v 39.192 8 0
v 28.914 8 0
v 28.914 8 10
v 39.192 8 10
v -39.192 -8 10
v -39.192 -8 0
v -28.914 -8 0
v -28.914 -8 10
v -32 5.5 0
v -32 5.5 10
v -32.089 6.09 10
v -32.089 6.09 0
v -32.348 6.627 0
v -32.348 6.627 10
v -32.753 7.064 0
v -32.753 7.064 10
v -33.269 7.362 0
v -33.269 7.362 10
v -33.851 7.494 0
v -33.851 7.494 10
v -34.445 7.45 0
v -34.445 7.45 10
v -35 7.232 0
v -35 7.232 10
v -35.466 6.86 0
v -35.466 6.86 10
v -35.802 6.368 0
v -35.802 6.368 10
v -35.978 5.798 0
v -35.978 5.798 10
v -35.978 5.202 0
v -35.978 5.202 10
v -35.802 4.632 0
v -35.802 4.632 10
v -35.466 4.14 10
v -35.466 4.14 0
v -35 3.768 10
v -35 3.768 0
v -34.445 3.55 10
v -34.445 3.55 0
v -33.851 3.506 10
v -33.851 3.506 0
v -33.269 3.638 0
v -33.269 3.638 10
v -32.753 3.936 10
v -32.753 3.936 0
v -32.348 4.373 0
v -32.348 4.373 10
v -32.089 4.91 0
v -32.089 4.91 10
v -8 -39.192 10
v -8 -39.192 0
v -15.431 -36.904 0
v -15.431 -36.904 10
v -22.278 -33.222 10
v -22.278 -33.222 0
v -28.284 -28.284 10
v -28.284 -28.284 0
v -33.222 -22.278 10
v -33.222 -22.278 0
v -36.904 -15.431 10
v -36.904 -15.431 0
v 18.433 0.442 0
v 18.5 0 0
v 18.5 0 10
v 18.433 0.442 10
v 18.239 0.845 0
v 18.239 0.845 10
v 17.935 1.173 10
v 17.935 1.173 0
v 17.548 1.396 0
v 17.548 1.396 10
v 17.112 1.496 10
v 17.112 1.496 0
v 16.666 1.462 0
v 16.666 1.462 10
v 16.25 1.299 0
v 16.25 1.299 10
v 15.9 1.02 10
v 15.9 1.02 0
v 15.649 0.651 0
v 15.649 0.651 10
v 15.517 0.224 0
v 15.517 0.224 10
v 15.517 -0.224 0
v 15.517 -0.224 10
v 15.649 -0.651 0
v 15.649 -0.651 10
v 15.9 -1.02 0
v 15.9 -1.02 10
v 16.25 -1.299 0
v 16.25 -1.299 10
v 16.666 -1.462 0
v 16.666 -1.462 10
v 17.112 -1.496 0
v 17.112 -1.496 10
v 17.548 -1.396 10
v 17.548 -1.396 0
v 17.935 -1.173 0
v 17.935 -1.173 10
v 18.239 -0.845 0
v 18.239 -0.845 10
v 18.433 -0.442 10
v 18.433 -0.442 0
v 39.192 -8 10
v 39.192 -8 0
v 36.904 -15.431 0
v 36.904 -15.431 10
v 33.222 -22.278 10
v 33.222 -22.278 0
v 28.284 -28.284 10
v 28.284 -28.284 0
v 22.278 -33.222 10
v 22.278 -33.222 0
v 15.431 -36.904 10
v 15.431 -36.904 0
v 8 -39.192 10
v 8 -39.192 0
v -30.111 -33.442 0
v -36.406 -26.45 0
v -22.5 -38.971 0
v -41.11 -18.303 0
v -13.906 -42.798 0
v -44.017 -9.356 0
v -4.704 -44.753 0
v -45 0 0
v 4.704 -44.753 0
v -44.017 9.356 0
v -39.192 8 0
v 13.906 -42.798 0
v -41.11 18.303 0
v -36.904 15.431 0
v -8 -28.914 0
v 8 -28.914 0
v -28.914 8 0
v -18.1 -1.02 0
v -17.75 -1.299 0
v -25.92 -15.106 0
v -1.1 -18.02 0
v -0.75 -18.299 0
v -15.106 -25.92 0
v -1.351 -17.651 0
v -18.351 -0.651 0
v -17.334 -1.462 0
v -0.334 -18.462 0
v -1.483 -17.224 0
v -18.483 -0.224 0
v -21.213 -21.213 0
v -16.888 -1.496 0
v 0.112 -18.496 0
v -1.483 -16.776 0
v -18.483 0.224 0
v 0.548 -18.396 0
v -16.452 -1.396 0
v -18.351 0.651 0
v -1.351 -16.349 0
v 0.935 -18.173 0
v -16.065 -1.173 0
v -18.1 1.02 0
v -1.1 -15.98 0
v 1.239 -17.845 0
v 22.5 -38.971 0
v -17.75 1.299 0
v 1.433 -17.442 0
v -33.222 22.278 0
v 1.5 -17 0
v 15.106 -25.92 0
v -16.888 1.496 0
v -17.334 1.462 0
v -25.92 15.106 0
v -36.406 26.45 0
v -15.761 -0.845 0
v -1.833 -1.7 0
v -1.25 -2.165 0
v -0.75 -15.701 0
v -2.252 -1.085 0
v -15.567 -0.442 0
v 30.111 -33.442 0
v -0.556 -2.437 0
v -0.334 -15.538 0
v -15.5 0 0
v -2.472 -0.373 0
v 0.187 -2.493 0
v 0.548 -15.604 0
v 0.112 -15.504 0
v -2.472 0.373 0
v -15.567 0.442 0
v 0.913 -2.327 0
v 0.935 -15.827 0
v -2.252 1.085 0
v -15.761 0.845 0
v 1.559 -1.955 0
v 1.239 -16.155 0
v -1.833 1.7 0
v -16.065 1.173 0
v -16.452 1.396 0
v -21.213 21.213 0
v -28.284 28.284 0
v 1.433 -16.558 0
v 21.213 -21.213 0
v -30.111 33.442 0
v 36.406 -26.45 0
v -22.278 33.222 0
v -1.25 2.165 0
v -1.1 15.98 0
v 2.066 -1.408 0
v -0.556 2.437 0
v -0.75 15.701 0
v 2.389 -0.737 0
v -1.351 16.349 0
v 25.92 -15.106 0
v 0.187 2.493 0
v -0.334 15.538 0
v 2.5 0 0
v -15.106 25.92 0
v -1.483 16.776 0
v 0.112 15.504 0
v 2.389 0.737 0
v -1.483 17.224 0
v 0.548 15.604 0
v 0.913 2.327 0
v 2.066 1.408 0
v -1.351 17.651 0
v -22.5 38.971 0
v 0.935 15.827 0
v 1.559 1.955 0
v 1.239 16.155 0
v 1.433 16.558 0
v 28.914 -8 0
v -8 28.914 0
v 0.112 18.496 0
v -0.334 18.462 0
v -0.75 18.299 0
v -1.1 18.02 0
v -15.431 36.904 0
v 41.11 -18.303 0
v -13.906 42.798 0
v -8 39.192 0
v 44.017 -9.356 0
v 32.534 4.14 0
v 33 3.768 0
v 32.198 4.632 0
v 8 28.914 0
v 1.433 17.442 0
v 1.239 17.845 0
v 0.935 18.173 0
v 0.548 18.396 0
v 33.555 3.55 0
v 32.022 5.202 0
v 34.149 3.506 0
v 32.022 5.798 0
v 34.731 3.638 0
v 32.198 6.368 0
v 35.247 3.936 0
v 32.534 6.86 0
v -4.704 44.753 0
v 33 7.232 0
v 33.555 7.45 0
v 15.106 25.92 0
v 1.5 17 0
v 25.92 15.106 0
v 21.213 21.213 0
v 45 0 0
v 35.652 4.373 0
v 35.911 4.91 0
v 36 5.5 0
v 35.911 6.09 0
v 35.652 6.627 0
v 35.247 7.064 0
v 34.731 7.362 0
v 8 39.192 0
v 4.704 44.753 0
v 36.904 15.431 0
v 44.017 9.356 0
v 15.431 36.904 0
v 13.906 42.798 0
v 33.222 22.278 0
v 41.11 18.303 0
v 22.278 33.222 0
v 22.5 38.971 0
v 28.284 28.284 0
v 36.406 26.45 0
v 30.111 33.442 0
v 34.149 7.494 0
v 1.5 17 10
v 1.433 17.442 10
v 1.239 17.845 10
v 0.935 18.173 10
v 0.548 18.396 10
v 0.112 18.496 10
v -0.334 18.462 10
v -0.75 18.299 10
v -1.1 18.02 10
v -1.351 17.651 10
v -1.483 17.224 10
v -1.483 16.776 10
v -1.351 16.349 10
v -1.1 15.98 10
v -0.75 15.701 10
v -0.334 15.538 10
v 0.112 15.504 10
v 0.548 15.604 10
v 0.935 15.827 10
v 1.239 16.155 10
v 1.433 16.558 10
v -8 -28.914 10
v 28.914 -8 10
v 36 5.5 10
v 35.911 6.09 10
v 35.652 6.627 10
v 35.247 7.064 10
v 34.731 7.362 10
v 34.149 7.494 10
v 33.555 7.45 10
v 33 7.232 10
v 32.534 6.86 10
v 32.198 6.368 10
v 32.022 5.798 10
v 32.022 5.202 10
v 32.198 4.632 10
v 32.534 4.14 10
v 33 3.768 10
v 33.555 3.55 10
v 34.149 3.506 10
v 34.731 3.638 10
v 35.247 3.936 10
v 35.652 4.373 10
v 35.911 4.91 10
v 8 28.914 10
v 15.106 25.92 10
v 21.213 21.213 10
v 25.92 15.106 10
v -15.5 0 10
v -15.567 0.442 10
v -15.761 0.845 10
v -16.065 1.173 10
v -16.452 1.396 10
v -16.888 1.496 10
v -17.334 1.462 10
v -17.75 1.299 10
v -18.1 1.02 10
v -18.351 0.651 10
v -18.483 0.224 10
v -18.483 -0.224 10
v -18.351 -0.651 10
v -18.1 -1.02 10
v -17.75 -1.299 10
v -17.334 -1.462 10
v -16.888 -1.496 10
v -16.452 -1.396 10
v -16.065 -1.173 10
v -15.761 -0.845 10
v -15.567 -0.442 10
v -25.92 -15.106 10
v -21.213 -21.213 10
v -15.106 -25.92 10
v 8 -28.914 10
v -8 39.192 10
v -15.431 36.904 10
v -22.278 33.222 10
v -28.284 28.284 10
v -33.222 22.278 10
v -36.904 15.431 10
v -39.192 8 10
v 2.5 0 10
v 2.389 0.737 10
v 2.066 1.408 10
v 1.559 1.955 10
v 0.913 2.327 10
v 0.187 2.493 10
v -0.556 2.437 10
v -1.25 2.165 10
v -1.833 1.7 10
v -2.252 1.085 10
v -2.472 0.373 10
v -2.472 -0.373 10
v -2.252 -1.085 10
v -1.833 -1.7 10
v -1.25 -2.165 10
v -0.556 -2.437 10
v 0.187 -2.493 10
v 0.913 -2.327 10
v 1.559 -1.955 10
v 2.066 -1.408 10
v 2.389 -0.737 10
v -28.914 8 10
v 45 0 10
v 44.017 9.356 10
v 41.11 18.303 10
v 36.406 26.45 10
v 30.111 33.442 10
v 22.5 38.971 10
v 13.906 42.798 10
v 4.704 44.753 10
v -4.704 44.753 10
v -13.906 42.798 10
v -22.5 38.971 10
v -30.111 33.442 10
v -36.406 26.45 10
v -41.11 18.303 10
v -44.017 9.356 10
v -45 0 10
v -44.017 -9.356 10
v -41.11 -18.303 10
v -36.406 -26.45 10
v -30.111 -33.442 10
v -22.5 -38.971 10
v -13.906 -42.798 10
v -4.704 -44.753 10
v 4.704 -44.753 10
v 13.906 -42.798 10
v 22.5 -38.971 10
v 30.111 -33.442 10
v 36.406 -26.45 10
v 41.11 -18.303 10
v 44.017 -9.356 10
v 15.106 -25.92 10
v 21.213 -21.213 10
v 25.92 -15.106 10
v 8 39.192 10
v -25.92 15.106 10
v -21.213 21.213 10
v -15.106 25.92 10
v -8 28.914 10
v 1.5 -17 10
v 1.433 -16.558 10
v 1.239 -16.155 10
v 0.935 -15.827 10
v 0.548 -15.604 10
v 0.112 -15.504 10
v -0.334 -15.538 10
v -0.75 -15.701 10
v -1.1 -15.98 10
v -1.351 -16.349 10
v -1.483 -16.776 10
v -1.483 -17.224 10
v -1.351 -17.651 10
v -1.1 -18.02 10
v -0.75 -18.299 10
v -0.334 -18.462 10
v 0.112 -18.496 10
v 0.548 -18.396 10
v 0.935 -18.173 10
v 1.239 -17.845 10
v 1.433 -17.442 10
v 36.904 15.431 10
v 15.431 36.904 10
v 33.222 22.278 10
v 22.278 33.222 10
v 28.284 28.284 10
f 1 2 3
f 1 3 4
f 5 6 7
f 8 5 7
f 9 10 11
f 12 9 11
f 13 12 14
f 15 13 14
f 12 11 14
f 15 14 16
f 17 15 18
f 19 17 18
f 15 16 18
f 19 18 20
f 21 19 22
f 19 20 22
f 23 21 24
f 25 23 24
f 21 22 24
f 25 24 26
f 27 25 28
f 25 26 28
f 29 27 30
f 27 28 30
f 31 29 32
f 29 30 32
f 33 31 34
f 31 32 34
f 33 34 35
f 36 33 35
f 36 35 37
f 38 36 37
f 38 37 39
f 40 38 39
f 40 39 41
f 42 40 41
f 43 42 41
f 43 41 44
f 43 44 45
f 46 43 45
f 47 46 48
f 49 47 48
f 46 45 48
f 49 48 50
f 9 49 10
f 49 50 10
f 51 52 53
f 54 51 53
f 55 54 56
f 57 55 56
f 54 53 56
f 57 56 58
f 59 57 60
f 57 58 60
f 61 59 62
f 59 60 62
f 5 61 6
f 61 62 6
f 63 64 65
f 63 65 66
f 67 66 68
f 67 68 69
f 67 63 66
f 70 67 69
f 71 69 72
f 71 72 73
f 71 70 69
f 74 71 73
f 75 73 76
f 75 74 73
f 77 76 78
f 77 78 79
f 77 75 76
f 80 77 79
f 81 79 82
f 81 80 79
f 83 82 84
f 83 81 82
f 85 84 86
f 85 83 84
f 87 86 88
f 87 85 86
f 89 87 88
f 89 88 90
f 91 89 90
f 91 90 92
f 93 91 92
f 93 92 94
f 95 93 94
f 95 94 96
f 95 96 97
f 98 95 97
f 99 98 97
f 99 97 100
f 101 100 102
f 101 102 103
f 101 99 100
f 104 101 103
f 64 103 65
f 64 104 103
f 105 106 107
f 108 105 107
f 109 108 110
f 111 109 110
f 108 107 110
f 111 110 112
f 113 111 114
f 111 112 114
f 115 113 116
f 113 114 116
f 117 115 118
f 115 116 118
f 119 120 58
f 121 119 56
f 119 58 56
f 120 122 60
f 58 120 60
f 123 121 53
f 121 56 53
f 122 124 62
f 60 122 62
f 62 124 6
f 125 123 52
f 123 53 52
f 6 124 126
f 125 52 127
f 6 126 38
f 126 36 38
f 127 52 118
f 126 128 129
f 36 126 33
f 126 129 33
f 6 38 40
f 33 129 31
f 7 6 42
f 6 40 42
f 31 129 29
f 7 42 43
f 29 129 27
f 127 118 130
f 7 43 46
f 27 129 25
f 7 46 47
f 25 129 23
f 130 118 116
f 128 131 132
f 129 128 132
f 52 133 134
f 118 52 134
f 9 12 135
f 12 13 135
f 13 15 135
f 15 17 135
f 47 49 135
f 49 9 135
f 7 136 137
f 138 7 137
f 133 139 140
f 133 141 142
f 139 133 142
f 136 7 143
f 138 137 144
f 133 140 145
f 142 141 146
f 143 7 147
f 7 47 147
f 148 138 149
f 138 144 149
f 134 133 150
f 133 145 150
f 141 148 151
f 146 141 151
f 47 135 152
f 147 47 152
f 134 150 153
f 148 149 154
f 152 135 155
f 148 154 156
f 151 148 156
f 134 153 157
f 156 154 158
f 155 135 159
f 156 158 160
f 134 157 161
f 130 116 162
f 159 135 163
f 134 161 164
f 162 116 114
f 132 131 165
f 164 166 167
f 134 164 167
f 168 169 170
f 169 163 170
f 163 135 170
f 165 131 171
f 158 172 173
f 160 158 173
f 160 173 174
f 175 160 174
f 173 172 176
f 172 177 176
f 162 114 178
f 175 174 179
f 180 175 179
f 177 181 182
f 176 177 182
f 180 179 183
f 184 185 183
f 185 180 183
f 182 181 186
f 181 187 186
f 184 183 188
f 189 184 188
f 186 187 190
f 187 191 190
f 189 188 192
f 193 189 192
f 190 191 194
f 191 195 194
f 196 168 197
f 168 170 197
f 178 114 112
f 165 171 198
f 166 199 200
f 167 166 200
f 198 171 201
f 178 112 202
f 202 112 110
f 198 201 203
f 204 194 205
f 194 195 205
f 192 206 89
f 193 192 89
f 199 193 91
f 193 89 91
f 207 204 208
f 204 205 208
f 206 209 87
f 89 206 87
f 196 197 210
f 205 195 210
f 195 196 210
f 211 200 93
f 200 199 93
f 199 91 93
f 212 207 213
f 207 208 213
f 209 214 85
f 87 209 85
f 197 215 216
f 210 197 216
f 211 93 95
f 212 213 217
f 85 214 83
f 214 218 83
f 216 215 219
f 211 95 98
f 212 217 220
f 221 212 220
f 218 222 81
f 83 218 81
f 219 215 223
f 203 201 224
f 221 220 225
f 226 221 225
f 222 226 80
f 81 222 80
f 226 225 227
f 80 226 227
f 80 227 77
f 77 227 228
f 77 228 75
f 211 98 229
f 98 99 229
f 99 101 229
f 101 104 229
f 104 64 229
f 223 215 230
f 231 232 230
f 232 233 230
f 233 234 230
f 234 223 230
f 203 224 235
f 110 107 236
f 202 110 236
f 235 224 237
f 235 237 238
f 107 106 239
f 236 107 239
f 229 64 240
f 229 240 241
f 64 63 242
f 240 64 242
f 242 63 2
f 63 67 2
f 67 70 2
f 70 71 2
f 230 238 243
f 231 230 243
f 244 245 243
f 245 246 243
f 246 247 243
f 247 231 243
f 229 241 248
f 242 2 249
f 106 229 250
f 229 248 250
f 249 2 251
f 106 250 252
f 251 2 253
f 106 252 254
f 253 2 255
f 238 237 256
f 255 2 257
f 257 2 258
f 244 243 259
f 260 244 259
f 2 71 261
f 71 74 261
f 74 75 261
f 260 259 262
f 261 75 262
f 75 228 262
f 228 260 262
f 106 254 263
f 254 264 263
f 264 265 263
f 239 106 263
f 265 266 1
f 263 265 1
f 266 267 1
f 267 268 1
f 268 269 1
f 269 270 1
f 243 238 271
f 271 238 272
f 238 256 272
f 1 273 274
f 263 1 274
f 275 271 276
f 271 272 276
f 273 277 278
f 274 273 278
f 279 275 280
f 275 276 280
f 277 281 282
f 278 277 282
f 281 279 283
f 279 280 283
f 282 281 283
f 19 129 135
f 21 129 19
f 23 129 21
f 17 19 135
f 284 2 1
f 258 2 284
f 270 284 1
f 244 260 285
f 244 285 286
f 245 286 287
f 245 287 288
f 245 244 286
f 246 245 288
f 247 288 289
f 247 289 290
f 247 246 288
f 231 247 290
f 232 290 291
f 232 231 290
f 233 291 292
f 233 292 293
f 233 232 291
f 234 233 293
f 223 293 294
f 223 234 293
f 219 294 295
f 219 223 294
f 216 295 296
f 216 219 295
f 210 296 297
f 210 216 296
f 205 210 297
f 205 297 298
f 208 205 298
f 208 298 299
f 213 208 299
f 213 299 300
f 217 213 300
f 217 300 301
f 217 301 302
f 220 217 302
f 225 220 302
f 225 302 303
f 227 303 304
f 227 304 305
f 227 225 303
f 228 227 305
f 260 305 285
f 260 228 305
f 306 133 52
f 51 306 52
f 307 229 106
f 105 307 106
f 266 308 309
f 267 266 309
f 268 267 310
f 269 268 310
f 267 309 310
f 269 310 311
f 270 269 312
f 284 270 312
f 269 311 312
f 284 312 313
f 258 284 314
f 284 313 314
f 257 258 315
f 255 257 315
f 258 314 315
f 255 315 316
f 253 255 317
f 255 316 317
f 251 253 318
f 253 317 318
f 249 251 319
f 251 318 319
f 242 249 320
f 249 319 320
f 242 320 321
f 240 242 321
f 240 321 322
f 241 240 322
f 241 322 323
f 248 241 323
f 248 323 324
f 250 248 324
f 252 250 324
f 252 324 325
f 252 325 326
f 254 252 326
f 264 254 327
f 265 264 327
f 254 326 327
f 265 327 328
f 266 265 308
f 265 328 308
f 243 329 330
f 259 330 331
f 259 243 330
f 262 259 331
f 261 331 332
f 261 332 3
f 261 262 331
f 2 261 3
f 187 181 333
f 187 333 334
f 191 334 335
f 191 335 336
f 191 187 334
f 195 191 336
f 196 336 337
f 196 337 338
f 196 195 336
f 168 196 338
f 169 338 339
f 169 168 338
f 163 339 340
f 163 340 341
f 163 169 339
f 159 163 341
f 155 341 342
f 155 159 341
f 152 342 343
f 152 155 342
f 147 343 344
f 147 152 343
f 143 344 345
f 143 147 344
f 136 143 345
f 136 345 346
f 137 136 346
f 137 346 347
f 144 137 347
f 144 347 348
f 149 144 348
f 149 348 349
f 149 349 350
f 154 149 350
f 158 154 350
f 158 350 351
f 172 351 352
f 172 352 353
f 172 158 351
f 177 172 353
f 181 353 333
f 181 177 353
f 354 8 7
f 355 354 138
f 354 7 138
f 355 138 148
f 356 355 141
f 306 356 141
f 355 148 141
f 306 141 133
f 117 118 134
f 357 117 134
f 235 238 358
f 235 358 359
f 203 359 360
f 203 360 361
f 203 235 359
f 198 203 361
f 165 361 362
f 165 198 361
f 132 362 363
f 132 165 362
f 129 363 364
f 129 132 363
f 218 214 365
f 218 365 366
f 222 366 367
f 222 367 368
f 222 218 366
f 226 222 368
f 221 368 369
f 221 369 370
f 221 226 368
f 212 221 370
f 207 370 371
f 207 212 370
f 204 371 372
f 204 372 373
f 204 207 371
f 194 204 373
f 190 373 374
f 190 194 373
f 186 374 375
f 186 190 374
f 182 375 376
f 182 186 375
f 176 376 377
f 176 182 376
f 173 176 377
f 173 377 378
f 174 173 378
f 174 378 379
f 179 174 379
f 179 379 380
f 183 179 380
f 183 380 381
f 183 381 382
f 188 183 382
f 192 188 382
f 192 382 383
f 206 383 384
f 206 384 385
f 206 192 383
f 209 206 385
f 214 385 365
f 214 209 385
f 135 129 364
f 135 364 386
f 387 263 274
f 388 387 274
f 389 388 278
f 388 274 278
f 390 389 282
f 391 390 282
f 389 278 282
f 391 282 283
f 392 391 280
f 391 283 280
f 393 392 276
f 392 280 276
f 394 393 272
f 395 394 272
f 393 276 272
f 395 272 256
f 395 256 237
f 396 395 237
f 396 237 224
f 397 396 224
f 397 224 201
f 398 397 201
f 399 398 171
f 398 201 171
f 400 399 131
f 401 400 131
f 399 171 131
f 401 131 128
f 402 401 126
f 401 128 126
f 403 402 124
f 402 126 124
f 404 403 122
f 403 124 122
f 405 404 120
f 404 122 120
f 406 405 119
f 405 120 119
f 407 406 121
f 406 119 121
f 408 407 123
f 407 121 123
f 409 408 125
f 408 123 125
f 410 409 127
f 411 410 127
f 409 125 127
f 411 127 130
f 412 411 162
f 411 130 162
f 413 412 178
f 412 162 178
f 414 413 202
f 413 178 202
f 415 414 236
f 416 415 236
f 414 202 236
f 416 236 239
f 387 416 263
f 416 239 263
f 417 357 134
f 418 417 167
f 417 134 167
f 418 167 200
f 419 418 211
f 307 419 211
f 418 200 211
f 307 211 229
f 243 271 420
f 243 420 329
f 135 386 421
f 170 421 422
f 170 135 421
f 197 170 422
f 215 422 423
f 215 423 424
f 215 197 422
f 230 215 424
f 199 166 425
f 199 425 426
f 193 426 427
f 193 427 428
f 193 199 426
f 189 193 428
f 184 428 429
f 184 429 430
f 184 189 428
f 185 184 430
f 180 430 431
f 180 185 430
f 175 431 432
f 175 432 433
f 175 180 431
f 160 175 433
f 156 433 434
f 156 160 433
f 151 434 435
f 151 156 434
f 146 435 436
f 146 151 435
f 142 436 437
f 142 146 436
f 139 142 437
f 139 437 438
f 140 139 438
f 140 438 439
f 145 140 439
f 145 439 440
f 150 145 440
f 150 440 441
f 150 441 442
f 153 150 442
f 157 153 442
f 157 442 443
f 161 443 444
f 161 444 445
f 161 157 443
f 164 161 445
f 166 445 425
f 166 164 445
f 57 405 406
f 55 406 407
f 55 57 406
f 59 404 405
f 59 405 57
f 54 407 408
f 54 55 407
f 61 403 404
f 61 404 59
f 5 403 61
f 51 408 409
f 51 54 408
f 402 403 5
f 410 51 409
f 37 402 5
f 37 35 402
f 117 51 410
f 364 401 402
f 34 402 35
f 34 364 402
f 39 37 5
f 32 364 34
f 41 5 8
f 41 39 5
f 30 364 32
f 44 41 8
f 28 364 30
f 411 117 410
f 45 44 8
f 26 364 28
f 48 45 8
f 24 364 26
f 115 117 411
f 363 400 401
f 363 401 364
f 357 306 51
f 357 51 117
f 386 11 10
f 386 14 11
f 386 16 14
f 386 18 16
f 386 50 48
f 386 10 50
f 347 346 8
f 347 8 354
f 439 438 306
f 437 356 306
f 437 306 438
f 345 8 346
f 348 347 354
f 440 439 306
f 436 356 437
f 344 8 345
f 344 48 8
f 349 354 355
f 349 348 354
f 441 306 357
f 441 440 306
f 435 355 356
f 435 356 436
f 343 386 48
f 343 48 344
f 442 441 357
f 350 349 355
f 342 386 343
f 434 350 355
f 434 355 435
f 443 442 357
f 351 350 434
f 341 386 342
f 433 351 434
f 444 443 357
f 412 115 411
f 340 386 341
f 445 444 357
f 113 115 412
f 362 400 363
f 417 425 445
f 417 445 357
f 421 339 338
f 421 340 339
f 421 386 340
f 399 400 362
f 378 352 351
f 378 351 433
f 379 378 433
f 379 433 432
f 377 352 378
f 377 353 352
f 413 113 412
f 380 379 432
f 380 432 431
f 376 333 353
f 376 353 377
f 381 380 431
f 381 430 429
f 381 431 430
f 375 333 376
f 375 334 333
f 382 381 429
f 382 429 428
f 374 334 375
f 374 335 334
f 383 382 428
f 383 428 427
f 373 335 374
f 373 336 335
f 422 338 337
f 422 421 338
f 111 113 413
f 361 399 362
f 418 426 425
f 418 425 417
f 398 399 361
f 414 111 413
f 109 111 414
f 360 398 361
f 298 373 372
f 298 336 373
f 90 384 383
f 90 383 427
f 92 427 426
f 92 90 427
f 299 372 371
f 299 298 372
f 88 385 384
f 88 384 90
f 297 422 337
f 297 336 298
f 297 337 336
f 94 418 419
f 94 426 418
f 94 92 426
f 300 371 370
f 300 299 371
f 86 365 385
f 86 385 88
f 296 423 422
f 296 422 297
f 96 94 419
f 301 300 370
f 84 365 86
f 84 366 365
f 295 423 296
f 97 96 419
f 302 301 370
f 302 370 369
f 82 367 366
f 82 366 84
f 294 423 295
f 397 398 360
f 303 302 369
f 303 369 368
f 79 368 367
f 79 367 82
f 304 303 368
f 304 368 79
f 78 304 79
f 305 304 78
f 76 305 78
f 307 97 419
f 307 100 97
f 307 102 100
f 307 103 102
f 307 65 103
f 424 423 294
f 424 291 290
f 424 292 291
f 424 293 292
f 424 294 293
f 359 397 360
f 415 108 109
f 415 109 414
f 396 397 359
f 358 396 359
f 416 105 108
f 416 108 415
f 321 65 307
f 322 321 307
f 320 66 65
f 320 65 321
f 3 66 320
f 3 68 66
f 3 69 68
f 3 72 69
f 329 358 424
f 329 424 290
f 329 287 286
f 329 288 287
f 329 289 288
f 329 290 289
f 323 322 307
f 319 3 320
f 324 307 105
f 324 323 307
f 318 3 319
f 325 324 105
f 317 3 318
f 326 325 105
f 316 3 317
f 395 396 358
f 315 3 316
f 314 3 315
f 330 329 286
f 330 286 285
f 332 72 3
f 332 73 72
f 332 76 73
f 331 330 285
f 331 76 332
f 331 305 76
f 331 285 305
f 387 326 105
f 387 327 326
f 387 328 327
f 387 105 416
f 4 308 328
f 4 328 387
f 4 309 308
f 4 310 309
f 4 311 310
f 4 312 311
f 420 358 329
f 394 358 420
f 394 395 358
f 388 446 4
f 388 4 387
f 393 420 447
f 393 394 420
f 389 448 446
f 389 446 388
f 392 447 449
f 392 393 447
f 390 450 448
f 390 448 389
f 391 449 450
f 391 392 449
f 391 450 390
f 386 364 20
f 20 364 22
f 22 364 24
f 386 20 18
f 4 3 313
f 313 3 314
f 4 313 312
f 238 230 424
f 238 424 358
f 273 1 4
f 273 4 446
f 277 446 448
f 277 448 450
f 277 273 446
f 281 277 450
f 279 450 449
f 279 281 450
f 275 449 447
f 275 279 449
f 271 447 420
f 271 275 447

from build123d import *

# Parameters (mm, degrees)
SKETCH1_R           = 45
SKETCH1_R_2         = 2.5
SKETCH1_R_3         = 1.5
BOSS_EXTRUDE1_DEPTH = 10
SKETCH3_R           = 2
CUT_EXTRUDE1_DEPTH  = 10


with BuildPart() as part:
    # Sketch1 → Boss-Extrude1 (new body)
    with BuildSketch(Plane.XY):
        Circle(SKETCH1_R)
        Circle(SKETCH1_R_2, mode=Mode.SUBTRACT)
        with Locations((0, 17)):
            Circle(SKETCH1_R_3, mode=Mode.SUBTRACT)
        with Locations((17, 0)):
            Circle(SKETCH1_R_3, mode=Mode.SUBTRACT)
        with Locations((0, -17)):
            Circle(SKETCH1_R_3, mode=Mode.SUBTRACT)
        with Locations((-17, 0)):
            Circle(SKETCH1_R_3, mode=Mode.SUBTRACT)
        with BuildLine():
            Line((28.91366459, 8), (39.191835885, 8))
            ThreePointArc((39.191835885, 8), (28.284271247, 28.284271247), (8, 39.191835885))
            Line((8, 39.191835885), (8, 28.91366459))
            ThreePointArc((8, 28.91366459), (21.213203436, 21.213203436), (28.91366459, 8))
        make_face(mode=Mode.SUBTRACT)
        with BuildLine():
            Line((28.91366459, -8), (39.191835885, -8))
            ThreePointArc((39.191835885, -8), (28.284271247, -28.284271247), (8, -39.191835885))
            Line((8, -39.191835885), (8, -28.91366459))
            ThreePointArc((8, -28.91366459), (21.213203436, -21.213203436), (28.91366459, -8))
        make_face(mode=Mode.SUBTRACT)
        with BuildLine():
            Line((-8, -28.91366459), (-8, -39.191835885))
            ThreePointArc((-8, -39.191835885), (-28.284271247, -28.284271247), (-39.191835885, -8))
            Line((-39.191835885, -8), (-28.91366459, -8))
            ThreePointArc((-28.91366459, -8), (-21.213203436, -21.213203436), (-8, -28.91366459))
        make_face(mode=Mode.SUBTRACT)
        with BuildLine():
            Line((-39.191835885, 8), (-28.91366459, 8))
            ThreePointArc((-28.91366459, 8), (-21.213203436, 21.213203436), (-8, 28.91366459))
            Line((-8, 28.91366459), (-8, 39.191835885))
            ThreePointArc((-8, 39.191835885), (-28.284271247, 28.284271247), (-39.191835885, 8))
        make_face(mode=Mode.SUBTRACT)
    extrude(amount=BOSS_EXTRUDE1_DEPTH)

    # Sketch3 → Cut-Extrude1 (cut)
    with BuildSketch(Plane.XY.offset(10)):
        with Locations((-34, 5.5)):
            Circle(SKETCH3_R)
        with Locations((34, 5.5)):
            Circle(SKETCH3_R)
    extrude(amount=-CUT_EXTRUDE1_DEPTH, mode=Mode.SUBTRACT)


solid = part.part
